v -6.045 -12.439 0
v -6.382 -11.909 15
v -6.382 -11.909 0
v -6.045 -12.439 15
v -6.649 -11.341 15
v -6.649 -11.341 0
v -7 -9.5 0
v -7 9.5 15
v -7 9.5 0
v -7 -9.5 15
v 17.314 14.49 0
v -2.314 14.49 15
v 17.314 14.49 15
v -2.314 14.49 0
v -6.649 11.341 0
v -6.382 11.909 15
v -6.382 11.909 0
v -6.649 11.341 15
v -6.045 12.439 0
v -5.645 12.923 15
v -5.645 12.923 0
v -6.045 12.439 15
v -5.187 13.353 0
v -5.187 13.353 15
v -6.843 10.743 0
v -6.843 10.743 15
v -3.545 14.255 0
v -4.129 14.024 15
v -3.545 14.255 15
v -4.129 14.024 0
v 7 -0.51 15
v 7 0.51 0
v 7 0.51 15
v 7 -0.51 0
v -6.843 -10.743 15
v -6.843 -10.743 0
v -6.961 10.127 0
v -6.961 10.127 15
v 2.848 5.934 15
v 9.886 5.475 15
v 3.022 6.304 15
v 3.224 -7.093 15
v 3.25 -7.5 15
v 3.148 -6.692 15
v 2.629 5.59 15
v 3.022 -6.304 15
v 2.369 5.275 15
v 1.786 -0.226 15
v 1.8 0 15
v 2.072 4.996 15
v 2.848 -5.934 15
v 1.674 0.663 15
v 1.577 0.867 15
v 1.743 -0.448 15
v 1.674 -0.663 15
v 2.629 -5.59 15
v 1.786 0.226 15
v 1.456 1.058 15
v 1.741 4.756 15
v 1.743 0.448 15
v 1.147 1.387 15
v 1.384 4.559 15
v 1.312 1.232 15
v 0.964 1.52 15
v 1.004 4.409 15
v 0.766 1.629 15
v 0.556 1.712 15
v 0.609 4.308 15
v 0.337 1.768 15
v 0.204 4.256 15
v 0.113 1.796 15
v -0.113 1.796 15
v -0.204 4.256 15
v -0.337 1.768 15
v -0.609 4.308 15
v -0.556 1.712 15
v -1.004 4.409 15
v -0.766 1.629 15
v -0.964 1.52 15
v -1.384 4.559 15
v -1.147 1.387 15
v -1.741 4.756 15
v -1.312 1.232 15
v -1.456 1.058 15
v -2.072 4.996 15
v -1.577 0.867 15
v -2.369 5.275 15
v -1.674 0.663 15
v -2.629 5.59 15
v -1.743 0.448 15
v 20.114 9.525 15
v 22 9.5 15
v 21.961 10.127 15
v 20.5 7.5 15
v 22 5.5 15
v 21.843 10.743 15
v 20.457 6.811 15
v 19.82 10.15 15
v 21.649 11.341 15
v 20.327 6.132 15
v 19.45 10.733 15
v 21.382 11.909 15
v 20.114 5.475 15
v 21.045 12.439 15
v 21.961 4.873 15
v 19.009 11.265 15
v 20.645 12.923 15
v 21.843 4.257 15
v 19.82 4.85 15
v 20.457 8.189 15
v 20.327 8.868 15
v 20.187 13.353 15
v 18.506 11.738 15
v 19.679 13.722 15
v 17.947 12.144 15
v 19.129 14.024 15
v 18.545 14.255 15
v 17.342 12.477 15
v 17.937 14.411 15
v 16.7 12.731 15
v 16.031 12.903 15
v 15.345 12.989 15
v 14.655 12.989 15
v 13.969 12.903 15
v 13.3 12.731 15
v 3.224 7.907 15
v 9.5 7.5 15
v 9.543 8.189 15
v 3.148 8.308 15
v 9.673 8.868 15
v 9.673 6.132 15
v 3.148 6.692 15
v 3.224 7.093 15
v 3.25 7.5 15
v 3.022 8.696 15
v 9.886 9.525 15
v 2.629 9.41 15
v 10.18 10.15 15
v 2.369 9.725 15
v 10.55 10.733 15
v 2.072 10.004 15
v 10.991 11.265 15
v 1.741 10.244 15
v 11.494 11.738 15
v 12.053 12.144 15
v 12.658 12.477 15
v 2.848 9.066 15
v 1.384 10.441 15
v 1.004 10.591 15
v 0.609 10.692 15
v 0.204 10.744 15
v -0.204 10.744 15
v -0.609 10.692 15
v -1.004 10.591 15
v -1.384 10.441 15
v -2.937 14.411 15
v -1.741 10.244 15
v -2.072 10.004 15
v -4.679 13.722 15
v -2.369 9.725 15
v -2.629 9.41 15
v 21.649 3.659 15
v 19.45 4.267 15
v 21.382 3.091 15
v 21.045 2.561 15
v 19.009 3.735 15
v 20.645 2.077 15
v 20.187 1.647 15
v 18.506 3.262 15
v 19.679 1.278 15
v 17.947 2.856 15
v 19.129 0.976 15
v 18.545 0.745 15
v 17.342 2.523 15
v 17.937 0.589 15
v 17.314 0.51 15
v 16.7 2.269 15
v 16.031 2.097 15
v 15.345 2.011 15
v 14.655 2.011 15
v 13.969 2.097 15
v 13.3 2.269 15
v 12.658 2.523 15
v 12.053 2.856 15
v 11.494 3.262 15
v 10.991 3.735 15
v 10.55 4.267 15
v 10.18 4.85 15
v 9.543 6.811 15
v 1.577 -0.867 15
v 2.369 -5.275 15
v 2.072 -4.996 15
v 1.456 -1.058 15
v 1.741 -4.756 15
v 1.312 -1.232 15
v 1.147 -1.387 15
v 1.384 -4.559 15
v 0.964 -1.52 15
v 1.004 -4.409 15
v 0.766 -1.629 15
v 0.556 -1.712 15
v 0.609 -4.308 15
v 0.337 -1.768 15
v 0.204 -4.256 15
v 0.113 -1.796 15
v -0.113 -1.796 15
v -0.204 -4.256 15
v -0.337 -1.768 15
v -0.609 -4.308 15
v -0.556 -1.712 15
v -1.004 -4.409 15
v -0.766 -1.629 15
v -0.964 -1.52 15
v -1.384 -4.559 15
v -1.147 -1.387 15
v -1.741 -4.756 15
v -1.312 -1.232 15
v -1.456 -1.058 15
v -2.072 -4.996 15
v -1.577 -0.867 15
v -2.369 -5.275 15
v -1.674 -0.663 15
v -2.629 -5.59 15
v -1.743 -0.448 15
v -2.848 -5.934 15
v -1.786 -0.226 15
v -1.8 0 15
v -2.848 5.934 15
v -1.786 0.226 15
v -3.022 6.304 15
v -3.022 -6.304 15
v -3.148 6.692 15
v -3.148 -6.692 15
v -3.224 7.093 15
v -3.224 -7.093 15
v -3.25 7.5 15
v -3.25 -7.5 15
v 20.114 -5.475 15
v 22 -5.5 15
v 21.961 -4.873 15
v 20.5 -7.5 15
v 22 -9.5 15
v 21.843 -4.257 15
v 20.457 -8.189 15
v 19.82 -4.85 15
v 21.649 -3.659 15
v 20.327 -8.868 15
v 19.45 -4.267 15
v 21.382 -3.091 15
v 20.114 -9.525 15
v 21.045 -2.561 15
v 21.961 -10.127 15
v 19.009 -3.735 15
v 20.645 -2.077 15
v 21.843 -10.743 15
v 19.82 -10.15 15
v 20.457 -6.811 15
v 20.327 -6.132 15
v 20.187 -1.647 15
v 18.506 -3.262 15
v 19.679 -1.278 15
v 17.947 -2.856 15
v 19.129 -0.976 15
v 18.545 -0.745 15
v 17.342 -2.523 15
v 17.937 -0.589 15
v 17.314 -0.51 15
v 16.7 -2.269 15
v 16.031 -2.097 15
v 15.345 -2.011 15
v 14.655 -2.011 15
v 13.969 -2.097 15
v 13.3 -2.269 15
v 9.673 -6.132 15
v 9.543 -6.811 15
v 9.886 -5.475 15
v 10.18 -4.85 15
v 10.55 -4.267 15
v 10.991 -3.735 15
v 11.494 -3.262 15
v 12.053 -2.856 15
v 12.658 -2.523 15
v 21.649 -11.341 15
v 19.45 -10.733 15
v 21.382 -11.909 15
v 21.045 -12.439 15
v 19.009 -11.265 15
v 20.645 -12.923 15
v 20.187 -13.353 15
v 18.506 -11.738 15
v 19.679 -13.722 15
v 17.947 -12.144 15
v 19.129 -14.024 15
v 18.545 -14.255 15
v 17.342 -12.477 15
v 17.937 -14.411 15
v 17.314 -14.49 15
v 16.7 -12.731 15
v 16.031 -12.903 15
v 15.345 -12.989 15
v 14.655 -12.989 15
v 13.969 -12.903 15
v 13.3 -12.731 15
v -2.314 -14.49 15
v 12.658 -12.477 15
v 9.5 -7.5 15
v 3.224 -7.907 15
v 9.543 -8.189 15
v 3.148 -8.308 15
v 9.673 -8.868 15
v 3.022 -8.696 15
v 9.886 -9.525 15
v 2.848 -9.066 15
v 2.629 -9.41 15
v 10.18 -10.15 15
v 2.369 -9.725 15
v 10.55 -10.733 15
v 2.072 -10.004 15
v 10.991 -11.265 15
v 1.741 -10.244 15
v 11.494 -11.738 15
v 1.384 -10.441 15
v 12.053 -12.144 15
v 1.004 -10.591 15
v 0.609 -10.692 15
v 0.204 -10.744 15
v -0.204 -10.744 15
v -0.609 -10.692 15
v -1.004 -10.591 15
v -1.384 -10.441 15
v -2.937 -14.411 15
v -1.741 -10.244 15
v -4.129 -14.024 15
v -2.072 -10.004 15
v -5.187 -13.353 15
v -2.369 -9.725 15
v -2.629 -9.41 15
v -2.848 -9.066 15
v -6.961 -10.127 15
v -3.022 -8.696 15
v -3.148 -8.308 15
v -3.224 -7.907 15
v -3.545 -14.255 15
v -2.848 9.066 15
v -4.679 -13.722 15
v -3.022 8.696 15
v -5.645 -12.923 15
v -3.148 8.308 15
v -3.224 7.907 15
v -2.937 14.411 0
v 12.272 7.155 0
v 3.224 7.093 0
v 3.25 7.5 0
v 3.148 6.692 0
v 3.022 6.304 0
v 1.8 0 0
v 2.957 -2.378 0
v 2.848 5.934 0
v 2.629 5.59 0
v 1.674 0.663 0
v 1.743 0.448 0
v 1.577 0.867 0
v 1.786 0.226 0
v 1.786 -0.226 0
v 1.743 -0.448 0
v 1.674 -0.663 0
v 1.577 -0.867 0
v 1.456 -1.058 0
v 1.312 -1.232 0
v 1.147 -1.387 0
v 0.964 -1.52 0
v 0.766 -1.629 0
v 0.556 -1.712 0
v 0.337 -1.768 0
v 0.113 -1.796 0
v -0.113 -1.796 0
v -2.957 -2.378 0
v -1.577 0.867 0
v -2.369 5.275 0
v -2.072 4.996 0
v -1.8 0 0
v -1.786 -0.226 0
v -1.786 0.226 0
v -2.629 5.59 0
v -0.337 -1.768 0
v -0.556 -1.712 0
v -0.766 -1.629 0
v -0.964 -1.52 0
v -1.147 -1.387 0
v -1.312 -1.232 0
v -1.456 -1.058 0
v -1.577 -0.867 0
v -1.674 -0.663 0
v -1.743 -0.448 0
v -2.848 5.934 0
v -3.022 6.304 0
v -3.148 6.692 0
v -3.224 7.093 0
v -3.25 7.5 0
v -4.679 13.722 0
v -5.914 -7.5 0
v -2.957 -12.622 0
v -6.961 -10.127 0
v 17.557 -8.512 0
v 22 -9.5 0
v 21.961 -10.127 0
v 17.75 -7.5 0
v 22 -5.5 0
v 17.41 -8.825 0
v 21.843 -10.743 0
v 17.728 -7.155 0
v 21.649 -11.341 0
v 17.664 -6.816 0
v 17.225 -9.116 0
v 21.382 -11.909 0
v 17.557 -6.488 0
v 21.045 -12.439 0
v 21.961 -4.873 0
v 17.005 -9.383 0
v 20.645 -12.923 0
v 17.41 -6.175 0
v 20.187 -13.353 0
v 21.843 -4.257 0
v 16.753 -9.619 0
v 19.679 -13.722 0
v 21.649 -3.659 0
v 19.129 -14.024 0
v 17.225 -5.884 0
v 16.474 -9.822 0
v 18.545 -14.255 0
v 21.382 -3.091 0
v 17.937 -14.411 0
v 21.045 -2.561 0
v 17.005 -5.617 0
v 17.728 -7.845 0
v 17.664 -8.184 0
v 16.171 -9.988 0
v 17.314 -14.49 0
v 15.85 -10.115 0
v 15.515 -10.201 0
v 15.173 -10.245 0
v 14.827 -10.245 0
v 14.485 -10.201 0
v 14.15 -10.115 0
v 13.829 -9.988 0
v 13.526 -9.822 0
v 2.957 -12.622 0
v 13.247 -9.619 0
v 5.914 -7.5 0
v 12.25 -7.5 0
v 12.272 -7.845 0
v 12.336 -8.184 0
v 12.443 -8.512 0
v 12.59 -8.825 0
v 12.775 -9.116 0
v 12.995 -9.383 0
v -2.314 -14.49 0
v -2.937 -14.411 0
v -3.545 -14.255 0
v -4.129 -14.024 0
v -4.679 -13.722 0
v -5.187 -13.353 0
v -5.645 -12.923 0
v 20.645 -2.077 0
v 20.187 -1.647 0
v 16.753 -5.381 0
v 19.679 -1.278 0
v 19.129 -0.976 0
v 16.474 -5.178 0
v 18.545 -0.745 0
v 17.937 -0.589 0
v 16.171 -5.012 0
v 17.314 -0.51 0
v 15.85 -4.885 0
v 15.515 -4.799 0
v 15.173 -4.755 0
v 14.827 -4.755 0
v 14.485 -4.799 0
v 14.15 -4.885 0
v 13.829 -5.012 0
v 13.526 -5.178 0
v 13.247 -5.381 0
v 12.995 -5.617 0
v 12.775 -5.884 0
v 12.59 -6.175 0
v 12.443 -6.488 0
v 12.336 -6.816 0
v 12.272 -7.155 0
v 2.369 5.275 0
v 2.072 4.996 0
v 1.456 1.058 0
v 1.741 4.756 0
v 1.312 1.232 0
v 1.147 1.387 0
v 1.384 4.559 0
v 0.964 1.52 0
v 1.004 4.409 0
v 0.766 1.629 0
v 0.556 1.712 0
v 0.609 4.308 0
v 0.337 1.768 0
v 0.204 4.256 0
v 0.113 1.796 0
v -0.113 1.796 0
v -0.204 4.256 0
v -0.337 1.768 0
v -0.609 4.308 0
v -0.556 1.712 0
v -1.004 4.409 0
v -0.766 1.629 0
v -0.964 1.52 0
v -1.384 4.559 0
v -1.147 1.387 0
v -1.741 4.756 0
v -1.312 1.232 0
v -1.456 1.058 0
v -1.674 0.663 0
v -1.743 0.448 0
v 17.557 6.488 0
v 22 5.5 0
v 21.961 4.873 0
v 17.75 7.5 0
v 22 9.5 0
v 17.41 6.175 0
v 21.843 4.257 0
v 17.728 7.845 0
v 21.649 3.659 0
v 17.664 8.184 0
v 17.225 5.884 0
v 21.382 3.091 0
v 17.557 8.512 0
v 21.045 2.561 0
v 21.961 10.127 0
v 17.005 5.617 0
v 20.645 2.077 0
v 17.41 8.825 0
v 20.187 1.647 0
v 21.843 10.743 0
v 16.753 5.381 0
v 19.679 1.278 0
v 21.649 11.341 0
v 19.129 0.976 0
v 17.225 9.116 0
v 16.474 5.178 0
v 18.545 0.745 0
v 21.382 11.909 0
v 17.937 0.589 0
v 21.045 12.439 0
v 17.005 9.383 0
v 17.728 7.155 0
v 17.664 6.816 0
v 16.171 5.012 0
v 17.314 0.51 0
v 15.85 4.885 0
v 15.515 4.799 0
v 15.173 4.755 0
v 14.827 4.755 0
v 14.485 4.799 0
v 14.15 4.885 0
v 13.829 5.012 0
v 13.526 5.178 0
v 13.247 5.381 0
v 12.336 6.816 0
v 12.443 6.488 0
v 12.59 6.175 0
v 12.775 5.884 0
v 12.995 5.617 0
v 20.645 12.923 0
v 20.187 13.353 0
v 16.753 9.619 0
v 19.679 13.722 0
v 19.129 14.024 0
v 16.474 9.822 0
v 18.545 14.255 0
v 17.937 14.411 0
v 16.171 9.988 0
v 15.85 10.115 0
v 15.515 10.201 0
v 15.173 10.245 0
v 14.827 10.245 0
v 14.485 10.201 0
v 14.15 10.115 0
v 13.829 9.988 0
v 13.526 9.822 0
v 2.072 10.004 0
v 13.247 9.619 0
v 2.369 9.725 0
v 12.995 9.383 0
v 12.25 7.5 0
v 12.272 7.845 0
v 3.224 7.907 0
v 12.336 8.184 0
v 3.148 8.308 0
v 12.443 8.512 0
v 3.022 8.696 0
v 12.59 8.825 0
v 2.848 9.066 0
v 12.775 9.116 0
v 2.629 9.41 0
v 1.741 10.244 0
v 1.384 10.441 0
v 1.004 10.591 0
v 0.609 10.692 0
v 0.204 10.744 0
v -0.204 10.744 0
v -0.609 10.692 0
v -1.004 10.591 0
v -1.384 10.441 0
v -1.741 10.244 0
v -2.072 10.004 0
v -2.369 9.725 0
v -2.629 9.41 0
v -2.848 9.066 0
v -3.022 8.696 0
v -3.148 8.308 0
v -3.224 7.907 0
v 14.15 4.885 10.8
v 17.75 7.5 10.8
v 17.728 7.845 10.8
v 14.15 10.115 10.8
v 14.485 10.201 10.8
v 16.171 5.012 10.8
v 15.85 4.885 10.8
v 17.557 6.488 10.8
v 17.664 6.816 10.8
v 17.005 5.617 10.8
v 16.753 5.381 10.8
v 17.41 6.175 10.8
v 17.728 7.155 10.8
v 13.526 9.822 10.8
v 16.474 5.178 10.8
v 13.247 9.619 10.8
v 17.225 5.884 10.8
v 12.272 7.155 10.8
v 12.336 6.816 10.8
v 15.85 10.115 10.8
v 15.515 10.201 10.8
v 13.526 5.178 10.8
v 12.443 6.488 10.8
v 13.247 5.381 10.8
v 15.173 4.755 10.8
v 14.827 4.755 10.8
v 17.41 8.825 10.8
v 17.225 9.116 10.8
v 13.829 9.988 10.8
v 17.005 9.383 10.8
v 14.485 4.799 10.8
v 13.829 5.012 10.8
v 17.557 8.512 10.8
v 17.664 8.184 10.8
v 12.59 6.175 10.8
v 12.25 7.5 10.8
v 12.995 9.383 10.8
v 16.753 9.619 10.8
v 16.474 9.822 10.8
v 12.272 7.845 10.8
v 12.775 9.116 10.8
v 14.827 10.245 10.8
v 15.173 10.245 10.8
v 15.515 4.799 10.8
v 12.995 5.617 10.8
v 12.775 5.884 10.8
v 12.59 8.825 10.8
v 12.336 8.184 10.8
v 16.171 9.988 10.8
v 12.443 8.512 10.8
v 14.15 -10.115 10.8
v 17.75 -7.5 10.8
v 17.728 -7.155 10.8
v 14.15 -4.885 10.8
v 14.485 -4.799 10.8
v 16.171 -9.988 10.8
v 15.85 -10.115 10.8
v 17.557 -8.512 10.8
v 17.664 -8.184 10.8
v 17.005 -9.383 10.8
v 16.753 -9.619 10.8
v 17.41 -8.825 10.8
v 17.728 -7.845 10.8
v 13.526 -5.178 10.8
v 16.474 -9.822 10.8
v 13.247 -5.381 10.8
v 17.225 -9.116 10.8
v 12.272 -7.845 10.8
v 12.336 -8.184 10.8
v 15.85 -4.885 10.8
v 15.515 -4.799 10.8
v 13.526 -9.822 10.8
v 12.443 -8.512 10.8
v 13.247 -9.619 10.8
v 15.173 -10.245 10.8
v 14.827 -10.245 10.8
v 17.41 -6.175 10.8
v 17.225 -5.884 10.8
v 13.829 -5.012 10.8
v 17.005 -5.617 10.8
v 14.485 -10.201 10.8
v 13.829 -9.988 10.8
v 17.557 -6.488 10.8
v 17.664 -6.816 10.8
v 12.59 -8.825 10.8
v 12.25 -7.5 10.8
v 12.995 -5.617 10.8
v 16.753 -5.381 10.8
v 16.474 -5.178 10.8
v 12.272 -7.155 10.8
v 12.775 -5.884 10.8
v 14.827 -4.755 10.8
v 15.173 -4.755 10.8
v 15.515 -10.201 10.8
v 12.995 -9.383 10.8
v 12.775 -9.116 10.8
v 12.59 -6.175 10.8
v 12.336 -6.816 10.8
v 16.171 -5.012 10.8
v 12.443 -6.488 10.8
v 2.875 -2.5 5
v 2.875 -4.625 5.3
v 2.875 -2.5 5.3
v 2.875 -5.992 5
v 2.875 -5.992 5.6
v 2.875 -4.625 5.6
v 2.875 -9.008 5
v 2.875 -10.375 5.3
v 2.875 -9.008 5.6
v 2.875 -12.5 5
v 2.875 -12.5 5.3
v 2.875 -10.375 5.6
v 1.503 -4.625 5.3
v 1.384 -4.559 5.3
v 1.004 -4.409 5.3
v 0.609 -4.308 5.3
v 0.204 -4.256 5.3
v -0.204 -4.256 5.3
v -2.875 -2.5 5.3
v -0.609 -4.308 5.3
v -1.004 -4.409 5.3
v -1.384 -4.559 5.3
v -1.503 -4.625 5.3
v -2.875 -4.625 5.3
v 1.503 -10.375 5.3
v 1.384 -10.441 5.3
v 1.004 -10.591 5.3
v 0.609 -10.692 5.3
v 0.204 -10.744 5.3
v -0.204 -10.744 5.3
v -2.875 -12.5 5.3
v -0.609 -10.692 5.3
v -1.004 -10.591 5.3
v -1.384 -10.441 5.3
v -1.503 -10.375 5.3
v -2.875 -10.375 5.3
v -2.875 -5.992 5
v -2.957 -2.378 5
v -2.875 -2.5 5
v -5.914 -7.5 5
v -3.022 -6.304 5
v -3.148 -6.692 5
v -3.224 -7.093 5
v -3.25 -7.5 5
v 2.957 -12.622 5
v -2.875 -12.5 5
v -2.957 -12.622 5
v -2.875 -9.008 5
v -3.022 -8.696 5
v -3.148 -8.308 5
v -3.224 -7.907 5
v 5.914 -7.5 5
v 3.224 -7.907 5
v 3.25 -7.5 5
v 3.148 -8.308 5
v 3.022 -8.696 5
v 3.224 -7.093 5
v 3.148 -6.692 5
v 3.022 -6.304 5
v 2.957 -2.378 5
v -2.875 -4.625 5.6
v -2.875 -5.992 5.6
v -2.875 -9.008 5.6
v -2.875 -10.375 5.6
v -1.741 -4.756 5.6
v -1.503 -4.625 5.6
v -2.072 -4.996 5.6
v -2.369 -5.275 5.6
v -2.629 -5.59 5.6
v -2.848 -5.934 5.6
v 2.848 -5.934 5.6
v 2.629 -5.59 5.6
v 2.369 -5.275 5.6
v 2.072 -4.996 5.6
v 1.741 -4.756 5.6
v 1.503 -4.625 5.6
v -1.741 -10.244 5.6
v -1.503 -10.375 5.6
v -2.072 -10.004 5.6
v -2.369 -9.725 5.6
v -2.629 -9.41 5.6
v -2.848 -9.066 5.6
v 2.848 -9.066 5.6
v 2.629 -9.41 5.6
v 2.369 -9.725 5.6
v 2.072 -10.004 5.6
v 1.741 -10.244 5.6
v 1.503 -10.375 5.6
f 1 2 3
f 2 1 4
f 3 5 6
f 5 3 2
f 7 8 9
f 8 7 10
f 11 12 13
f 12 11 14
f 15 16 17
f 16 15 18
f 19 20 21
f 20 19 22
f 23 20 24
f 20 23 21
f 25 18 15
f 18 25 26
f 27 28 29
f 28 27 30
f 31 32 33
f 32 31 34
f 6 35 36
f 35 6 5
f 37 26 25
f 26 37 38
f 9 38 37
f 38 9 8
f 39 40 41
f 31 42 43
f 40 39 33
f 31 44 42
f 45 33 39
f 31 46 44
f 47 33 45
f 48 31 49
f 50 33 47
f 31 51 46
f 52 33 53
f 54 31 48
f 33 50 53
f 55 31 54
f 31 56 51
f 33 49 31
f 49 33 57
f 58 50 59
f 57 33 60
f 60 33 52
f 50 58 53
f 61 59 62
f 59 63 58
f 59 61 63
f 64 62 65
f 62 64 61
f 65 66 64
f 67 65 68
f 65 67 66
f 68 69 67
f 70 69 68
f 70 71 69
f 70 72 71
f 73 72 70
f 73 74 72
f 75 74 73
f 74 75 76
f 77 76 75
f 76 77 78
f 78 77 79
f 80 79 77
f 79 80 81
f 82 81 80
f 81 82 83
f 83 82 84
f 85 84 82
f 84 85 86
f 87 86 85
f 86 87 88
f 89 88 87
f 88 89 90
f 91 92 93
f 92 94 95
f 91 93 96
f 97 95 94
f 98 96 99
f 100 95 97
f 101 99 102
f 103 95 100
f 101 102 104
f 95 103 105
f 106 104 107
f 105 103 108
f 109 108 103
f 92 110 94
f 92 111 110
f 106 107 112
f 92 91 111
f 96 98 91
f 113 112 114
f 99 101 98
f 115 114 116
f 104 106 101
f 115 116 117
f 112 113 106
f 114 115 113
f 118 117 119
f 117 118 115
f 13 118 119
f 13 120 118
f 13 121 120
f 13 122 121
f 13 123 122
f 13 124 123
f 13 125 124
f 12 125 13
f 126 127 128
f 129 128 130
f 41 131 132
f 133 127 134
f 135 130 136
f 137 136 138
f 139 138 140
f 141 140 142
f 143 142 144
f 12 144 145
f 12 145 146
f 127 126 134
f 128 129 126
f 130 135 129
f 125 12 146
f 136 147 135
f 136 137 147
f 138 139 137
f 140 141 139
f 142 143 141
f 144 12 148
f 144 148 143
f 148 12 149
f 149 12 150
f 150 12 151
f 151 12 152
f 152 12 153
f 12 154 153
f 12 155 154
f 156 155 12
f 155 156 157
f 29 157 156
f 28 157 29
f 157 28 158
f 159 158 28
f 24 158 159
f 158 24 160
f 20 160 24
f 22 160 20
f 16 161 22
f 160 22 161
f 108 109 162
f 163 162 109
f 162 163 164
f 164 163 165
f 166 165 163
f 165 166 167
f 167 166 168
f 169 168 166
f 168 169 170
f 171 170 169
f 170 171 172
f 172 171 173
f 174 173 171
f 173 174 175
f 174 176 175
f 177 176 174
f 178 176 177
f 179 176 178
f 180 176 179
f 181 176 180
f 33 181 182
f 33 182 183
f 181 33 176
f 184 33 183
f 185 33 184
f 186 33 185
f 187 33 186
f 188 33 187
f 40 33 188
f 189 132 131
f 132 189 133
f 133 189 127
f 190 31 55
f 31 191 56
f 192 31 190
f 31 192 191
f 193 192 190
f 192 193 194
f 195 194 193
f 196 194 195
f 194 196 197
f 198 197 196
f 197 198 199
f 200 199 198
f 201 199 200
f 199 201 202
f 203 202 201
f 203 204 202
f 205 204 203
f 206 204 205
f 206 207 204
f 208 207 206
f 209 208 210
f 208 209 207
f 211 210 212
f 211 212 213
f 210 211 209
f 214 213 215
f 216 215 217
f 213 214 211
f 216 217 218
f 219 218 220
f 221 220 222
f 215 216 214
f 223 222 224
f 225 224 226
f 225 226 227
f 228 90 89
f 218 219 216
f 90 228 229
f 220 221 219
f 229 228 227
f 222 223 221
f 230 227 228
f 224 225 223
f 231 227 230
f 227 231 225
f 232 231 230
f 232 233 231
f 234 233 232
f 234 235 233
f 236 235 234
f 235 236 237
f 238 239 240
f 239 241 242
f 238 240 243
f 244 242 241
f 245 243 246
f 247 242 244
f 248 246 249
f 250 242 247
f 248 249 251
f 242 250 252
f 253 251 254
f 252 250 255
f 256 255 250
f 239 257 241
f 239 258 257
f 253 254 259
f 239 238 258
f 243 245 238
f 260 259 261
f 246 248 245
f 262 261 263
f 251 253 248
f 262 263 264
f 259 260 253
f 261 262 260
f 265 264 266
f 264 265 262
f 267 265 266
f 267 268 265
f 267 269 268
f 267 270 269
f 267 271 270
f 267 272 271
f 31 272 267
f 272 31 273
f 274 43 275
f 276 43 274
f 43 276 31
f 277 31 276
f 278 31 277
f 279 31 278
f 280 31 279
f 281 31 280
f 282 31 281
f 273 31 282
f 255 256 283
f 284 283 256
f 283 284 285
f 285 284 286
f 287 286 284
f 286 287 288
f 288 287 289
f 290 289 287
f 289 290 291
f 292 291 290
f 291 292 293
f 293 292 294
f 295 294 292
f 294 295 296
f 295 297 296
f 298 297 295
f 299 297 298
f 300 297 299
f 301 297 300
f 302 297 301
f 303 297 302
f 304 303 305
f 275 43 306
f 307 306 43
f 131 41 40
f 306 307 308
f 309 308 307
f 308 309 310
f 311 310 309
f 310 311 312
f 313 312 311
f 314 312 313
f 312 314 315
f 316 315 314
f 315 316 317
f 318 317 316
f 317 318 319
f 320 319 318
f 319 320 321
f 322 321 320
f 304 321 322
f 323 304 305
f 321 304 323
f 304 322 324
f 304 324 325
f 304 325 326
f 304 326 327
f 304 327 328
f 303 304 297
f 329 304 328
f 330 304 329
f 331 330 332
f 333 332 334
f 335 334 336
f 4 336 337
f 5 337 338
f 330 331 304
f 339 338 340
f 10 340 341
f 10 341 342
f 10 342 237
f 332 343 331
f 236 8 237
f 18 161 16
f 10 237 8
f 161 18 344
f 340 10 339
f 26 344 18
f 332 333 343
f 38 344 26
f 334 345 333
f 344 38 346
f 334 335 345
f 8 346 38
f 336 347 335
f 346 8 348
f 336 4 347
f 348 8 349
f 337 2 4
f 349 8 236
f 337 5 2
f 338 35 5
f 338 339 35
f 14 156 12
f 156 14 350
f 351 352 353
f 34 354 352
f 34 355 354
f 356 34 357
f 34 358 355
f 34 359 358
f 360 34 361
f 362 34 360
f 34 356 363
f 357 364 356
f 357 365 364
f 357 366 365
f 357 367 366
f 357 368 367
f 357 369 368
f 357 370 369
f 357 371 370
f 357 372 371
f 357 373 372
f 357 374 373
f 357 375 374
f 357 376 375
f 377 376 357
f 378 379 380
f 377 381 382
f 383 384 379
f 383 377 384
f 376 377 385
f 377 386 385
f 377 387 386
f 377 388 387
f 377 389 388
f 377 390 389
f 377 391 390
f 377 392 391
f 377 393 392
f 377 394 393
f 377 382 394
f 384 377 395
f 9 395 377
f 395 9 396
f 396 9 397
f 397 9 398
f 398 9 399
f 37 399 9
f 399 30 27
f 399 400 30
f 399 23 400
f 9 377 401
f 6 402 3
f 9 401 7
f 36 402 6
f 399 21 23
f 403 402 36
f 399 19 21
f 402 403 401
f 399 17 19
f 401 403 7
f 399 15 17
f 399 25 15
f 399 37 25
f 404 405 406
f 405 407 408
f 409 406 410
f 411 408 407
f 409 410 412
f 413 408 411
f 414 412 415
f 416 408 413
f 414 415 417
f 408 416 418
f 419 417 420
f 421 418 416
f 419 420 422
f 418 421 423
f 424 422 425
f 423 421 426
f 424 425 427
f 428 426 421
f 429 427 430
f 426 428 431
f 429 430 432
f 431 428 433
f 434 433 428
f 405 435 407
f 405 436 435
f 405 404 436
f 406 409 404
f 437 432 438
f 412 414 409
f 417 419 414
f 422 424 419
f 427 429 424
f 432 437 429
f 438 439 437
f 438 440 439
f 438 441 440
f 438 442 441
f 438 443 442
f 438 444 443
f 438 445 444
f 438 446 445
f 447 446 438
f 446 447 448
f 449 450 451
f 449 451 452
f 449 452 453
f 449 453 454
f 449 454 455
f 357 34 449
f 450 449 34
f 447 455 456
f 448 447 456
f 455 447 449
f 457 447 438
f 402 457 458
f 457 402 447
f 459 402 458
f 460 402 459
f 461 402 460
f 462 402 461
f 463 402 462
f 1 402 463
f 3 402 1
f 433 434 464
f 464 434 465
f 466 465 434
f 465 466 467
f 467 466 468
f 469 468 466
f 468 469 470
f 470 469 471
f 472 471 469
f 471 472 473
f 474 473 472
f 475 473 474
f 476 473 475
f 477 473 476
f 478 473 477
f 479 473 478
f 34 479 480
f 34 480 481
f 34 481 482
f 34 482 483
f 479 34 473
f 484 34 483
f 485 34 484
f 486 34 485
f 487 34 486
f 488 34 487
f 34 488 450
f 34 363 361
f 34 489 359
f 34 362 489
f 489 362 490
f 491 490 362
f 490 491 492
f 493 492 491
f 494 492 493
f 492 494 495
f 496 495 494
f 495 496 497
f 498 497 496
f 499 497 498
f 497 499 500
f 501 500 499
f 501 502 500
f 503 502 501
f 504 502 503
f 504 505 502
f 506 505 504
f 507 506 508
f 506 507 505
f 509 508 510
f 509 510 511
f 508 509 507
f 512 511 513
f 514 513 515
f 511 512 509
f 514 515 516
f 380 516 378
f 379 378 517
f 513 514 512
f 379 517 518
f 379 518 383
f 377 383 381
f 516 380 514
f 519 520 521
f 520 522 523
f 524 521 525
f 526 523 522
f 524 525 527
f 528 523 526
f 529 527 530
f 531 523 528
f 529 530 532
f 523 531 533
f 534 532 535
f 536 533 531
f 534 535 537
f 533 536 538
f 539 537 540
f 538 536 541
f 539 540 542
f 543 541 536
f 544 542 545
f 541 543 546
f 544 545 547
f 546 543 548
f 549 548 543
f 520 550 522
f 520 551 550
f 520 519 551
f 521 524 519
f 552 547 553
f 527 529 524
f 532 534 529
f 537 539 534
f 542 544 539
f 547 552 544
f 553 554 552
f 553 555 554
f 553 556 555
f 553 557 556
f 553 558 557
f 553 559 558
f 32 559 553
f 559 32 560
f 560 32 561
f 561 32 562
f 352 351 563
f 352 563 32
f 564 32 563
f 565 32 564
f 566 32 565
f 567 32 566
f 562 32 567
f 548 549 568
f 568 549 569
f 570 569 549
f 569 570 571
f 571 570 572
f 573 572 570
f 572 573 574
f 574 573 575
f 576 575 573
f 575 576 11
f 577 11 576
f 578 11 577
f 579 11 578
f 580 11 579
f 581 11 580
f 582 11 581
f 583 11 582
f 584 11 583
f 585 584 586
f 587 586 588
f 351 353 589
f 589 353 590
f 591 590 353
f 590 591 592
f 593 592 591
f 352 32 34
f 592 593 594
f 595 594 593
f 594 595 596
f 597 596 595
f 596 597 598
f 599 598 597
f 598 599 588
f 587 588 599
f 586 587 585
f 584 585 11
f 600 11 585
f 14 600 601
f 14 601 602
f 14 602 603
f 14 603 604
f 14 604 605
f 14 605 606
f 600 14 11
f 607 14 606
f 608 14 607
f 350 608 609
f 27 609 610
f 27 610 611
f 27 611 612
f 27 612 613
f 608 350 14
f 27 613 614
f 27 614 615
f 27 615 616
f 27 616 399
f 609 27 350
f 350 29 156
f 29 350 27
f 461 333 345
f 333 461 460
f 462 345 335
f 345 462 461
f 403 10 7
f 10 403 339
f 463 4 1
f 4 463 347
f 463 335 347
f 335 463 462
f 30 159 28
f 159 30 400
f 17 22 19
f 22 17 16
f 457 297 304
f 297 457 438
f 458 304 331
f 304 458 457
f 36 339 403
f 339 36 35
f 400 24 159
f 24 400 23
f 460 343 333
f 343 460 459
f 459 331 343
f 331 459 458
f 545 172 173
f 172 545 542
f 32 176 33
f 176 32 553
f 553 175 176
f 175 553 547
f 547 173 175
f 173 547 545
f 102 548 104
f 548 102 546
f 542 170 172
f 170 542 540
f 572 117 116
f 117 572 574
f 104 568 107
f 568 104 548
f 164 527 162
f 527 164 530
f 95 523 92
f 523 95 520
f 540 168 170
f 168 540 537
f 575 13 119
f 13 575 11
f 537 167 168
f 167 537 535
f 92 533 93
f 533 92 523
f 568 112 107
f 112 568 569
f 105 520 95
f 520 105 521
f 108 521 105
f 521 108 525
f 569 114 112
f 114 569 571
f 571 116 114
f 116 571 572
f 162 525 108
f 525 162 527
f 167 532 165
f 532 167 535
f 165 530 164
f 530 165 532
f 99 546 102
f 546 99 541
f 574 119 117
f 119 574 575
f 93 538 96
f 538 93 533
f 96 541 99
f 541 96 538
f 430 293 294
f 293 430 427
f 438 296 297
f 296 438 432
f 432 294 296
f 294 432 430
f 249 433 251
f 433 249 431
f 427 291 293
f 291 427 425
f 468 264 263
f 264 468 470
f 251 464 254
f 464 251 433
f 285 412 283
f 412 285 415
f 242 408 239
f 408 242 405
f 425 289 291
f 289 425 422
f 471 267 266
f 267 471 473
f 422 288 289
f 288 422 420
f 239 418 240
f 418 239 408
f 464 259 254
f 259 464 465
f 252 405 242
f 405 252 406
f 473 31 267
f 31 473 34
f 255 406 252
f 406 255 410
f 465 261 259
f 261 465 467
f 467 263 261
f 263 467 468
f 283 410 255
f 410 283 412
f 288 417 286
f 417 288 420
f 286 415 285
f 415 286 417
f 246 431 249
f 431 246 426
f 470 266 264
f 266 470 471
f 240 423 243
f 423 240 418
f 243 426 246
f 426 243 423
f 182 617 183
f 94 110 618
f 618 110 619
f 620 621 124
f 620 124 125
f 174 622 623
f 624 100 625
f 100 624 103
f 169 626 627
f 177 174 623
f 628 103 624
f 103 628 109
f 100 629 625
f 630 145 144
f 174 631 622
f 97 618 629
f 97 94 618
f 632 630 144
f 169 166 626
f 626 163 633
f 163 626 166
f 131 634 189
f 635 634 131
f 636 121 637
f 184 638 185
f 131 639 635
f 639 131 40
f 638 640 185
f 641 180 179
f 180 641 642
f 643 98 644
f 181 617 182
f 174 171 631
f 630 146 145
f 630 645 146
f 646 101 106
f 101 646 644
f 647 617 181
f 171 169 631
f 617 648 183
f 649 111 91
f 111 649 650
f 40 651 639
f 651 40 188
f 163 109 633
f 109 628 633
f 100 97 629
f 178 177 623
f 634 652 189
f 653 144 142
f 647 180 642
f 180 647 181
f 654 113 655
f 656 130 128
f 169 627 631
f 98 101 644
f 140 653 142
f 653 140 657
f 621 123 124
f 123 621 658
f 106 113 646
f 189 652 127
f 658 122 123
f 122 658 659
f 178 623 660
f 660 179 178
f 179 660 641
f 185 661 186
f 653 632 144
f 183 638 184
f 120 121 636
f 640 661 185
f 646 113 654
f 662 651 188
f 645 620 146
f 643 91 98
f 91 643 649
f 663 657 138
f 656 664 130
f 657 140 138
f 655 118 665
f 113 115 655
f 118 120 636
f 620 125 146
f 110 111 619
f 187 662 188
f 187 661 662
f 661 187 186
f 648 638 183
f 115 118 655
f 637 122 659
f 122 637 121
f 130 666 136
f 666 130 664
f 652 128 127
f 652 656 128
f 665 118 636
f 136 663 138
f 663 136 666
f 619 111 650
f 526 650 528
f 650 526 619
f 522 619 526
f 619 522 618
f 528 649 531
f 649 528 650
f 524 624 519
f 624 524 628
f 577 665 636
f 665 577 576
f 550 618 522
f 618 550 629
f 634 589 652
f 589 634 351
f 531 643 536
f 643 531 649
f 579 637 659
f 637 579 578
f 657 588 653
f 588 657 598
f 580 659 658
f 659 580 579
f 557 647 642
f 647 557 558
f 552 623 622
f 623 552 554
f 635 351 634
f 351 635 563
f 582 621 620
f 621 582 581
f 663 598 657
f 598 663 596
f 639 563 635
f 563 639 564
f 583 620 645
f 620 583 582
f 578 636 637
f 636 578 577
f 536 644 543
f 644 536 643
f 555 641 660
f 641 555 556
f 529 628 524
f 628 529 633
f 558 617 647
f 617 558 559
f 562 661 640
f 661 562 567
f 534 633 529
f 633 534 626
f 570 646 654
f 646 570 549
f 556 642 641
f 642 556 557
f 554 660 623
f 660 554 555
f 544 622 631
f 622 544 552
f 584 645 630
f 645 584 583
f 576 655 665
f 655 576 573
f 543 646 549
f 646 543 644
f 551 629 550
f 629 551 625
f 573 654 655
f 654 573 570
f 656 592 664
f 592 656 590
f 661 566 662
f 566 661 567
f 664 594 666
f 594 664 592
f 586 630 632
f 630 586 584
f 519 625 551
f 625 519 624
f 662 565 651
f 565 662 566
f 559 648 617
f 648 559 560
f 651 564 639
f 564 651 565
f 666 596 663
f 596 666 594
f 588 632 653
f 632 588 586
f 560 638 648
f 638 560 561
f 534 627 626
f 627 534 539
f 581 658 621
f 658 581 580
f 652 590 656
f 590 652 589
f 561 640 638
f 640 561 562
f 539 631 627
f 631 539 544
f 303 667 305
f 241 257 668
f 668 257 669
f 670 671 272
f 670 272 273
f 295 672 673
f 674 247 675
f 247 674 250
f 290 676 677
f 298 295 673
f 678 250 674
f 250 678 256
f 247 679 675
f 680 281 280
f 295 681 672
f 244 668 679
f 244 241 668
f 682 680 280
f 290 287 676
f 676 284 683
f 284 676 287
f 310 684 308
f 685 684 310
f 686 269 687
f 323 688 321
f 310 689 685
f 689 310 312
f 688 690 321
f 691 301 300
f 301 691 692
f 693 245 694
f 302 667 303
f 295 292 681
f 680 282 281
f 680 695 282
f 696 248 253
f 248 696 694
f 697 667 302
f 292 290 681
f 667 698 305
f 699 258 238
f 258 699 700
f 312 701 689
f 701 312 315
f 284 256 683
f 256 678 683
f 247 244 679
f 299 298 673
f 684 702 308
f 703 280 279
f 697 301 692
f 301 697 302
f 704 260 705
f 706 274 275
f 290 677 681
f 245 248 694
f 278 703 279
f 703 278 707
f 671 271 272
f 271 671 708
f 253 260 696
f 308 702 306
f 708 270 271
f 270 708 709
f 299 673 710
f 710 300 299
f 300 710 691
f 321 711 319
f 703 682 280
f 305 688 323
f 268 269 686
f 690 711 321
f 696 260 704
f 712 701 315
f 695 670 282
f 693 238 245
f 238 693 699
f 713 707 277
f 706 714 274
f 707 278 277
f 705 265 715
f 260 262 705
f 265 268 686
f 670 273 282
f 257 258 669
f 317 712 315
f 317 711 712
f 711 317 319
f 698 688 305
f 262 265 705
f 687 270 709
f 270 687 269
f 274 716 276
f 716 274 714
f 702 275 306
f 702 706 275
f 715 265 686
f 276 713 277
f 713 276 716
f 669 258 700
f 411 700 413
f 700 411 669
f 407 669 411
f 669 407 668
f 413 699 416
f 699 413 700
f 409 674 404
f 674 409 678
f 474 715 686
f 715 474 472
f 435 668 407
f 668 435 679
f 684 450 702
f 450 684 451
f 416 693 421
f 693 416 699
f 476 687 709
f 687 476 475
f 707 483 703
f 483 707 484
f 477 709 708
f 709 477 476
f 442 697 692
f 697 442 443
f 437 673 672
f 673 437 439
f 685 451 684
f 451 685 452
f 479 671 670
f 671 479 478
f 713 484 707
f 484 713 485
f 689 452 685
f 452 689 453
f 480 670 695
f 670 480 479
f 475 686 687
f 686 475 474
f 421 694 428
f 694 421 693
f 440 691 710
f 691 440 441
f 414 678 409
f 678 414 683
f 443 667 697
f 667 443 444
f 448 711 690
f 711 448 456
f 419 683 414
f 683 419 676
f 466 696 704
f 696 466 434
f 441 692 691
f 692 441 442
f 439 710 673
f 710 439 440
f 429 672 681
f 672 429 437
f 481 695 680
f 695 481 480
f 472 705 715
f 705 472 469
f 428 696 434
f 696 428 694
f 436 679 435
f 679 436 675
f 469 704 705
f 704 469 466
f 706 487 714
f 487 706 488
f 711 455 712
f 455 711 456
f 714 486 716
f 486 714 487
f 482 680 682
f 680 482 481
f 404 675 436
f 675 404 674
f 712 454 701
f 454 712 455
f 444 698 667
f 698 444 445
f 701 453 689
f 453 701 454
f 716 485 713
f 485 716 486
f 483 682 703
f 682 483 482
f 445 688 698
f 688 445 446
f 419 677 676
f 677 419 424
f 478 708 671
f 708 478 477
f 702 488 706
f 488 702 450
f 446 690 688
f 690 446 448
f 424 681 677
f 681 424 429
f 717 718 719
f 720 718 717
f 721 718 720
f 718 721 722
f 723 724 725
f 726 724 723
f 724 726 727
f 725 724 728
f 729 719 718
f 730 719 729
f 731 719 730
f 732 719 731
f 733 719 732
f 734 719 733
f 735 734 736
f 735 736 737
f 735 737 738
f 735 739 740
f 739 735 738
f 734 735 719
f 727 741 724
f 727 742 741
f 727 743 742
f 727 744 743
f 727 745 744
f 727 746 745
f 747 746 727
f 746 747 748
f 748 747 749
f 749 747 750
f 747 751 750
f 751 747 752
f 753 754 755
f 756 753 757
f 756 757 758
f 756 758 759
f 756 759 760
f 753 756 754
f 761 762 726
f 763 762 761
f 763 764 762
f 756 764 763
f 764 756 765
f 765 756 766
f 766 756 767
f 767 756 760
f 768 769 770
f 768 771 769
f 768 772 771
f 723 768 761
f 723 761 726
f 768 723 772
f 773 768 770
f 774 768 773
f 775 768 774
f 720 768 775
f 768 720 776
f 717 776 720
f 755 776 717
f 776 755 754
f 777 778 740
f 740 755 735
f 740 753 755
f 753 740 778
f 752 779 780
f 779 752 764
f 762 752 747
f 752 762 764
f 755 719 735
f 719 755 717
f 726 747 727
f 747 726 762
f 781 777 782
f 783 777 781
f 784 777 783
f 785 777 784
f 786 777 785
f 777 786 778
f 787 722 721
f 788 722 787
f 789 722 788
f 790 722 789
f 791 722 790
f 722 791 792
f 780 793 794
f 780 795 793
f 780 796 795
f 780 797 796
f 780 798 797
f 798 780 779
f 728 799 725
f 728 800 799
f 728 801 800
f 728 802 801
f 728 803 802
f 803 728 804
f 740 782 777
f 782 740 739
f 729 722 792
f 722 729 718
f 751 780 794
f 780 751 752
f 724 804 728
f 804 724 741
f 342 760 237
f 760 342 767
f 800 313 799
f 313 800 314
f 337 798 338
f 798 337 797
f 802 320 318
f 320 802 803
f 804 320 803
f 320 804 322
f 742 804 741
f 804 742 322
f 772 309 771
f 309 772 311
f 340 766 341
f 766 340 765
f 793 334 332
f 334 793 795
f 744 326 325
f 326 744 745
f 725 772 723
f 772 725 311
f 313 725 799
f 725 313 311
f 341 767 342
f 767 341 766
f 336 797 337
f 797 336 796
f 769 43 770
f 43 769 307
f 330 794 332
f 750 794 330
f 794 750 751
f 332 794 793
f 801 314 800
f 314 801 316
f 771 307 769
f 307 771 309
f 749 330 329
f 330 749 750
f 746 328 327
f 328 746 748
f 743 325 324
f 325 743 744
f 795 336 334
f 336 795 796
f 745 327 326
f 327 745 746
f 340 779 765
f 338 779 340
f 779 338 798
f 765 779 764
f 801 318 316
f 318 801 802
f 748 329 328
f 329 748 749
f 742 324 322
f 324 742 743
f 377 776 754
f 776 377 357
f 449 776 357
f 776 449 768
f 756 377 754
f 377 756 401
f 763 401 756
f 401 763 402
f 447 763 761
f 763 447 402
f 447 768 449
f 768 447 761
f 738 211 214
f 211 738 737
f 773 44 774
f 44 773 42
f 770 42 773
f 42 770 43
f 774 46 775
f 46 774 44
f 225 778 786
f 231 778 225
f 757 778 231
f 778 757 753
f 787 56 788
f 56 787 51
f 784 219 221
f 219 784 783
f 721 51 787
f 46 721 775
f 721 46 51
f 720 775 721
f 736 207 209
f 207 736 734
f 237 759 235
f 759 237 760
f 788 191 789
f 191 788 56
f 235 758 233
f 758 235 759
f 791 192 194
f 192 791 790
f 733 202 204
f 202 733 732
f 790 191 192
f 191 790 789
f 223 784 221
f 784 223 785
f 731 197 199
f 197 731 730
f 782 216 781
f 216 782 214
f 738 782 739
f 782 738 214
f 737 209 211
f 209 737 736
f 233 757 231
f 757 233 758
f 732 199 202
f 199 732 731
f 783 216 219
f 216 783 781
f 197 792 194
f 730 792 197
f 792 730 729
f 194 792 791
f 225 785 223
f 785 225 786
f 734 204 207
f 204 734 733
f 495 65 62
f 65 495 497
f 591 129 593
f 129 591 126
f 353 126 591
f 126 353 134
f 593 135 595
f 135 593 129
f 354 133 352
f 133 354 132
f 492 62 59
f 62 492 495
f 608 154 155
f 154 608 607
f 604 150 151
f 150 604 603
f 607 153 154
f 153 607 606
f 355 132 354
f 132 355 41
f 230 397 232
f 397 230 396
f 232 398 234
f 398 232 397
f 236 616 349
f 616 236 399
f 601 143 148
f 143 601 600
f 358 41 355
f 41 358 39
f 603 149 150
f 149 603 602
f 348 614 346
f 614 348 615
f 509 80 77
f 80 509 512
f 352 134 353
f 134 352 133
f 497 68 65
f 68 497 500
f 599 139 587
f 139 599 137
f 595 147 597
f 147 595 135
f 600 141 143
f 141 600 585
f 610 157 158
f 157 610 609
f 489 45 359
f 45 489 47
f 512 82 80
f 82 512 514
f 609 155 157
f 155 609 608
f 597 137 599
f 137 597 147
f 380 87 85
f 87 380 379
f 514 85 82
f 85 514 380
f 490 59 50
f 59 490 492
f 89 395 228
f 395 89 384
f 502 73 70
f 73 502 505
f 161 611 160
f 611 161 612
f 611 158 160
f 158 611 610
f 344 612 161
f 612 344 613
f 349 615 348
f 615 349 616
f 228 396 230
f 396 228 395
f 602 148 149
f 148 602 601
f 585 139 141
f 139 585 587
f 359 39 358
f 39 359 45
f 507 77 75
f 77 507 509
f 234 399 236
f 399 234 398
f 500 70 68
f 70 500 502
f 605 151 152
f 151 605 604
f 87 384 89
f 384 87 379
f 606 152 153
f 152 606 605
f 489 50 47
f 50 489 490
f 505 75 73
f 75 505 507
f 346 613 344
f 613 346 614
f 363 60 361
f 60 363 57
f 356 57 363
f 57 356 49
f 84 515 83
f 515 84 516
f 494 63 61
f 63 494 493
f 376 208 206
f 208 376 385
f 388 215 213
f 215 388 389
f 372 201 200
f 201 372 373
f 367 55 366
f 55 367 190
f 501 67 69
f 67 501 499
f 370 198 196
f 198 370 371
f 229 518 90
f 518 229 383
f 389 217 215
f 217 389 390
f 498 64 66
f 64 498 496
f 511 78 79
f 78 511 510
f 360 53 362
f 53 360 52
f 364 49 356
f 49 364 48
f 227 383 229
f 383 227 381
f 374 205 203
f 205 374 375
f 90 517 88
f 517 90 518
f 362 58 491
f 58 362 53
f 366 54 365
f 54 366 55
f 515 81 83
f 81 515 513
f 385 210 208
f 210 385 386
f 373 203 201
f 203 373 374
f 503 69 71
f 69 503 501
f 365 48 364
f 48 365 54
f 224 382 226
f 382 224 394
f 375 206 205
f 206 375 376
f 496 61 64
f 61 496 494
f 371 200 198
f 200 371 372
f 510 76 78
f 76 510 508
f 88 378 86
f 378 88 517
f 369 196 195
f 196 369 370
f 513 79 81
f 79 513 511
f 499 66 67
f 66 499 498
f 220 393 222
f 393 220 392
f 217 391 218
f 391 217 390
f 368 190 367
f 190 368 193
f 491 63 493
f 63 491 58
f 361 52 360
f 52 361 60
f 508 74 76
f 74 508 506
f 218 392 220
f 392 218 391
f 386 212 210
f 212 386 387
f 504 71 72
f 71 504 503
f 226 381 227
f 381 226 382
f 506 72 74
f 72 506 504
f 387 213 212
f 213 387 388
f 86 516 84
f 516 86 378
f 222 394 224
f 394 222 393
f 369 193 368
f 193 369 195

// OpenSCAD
$fn = 50;


difference() {
	union() {
		hull() {
			translate(v = [-2.0000000000, 9.5000000000, 0]) {
				cylinder(h = 15, r = 5);
			}
			translate(v = [2.0000000000, 9.5000000000, 0]) {
				cylinder(h = 15, r = 5);
			}
			translate(v = [-2.0000000000, -9.5000000000, 0]) {
				cylinder(h = 15, r = 5);
			}
			translate(v = [2.0000000000, -9.5000000000, 0]) {
				cylinder(h = 15, r = 5);
			}
		}
		translate(v = [7.5000000000, 7.5000000000, 0]) {
			hull() {
				translate(v = [-9.5000000000, 2.0000000000, 0]) {
					cylinder(h = 15, r = 5);
				}
				translate(v = [9.5000000000, 2.0000000000, 0]) {
					cylinder(h = 15, r = 5);
				}
				translate(v = [-9.5000000000, -2.0000000000, 0]) {
					cylinder(h = 15, r = 5);
				}
				translate(v = [9.5000000000, -2.0000000000, 0]) {
					cylinder(h = 15, r = 5);
				}
			}
		}
		translate(v = [7.5000000000, -7.5000000000, 0]) {
			hull() {
				translate(v = [-9.5000000000, 2.0000000000, 0]) {
					cylinder(h = 15, r = 5);
				}
				translate(v = [9.5000000000, 2.0000000000, 0]) {
					cylinder(h = 15, r = 5);
				}
				translate(v = [-9.5000000000, -2.0000000000, 0]) {
					cylinder(h = 15, r = 5);
				}
				translate(v = [9.5000000000, -2.0000000000, 0]) {
					cylinder(h = 15, r = 5);
				}
			}
		}
	}
	union() {
		translate(v = [15.0000000000, 7.5000000000, 15]) {
			rotate(a = [0, 0, 0]) {
				difference() {
					union() {
						#translate(v = [0, 0, -15.0000000000]) {
							cylinder(h = 15, r = 2.2500000000);
						}
						#translate(v = [0, 0, -4.2000000000]) {
							cylinder(h = 4.2000000000, r1 = 2.7500000000, r2 = 5.5000000000);
						}
						#translate(v = [0, 0, -15.0000000000]) {
							cylinder(h = 15, r = 2.7500000000);
						}
						#translate(v = [0, 0, -15.0000000000]) {
							cylinder(h = 15, r = 2.2500000000);
						}
					}
					union();
				}
			}
		}
		translate(v = [15.0000000000, -7.5000000000, 15]) {
			rotate(a = [0, 0, 0]) {
				difference() {
					union() {
						#translate(v = [0, 0, -15.0000000000]) {
							cylinder(h = 15, r = 2.2500000000);
						}
						#translate(v = [0, 0, -4.2000000000]) {
							cylinder(h = 4.2000000000, r1 = 2.7500000000, r2 = 5.5000000000);
						}
						#translate(v = [0, 0, -15.0000000000]) {
							cylinder(h = 15, r = 2.7500000000);
						}
						#translate(v = [0, 0, -15.0000000000]) {
							cylinder(h = 15, r = 2.2500000000);
						}
					}
					union();
				}
			}
		}
		translate(v = [0.0000000000, -7.5000000000, 0]) {
			rotate(a = [0, 0, 0]) {
				difference() {
					union() {
						#translate(v = [-2.8750000000, -5.0000000000, -0.3000000000]) {
							cube(size = [5.7500000000, 10, 0.3000000000]);
						}
						#translate(v = [-2.8750000000, -2.8750000000, -0.6000000000]) {
							cube(size = [5.7500000000, 5.7500000000, 0.3000000000]);
						}
						#translate(v = [-2.8750000000, -5.0000000000, 5]) {
							cube(size = [5.7500000000, 10, 0.3000000000]);
						}
						#translate(v = [-2.8750000000, -2.8750000000, 5.3000000000]) {
							cube(size = [5.7500000000, 5.7500000000, 0.3000000000]);
						}
						#translate(v = [0, 0, -100.0000000000]) {
							cylinder(h = 200, r = 3.2500000000);
						}
						#linear_extrude(height = 5) {
							polygon(points = [[5.9142500000, 0.0000000000], [2.9571250000, 5.1218907443], [-2.9571250000, 5.1218907443], [-5.9142500000, 0.0000000000], [-2.9571250000, -5.1218907443], [2.9571250000, -5.1218907443]]);
						}
						#translate(v = [-2.8750000000, -5.0000000000, -0.3000000000]) {
							cube(size = [5.7500000000, 10, 0.3000000000]);
						}
						#translate(v = [-2.8750000000, -2.8750000000, -0.6000000000]) {
							cube(size = [5.7500000000, 5.7500000000, 0.3000000000]);
						}
						#translate(v = [-2.8750000000, -5.0000000000, 5]) {
							cube(size = [5.7500000000, 10, 0.3000000000]);
						}
						#translate(v = [-2.8750000000, -2.8750000000, 5.3000000000]) {
							cube(size = [5.7500000000, 5.7500000000, 0.3000000000]);
						}
						#translate(v = [0, 0, -100.0000000000]) {
							cylinder(h = 200, r = 3.2500000000);
						}
						#translate(v = [-2.8750000000, -5.0000000000, -0.3000000000]) {
							cube(size = [5.7500000000, 10, 0.3000000000]);
						}
						#translate(v = [-2.8750000000, -2.8750000000, -0.6000000000]) {
							cube(size = [5.7500000000, 5.7500000000, 0.3000000000]);
						}
						#translate(v = [-2.8750000000, -5.0000000000, 5]) {
							cube(size = [5.7500000000, 10, 0.3000000000]);
						}
						#translate(v = [-2.8750000000, -2.8750000000, 5.3000000000]) {
							cube(size = [5.7500000000, 5.7500000000, 0.3000000000]);
						}
						#translate(v = [0, 0, -100.0000000000]) {
							cylinder(h = 200, r = 3.2500000000);
						}
					}
					union();
				}
			}
		}
		translate(v = [0.0000000000, -7.5000000000, 0]) {
			translate(v = [0, 0, -100]) {
				cylinder(h = 200, r = 3.2500000000);
			}
		}
		translate(v = [0.0000000000, 7.5000000000, 0]) {
			translate(v = [0, 0, -100]) {
				cylinder(h = 200, r = 3.2500000000);
			}
		}
		translate(v = [0.0000000000, -7.5000000000, 0]) {
			translate(v = [0, 0, -100]) {
				cylinder(h = 200, r = 1.8000000000);
			}
		}
		translate(v = [0, 0, -100]) {
			cylinder(h = 200, r = 1.8000000000);
		}
		translate(v = [0.0000000000, 7.5000000000, 0]) {
			translate(v = [0, 0, -100]) {
				cylinder(h = 200, r = 1.8000000000);
			}
		}
	}
}
